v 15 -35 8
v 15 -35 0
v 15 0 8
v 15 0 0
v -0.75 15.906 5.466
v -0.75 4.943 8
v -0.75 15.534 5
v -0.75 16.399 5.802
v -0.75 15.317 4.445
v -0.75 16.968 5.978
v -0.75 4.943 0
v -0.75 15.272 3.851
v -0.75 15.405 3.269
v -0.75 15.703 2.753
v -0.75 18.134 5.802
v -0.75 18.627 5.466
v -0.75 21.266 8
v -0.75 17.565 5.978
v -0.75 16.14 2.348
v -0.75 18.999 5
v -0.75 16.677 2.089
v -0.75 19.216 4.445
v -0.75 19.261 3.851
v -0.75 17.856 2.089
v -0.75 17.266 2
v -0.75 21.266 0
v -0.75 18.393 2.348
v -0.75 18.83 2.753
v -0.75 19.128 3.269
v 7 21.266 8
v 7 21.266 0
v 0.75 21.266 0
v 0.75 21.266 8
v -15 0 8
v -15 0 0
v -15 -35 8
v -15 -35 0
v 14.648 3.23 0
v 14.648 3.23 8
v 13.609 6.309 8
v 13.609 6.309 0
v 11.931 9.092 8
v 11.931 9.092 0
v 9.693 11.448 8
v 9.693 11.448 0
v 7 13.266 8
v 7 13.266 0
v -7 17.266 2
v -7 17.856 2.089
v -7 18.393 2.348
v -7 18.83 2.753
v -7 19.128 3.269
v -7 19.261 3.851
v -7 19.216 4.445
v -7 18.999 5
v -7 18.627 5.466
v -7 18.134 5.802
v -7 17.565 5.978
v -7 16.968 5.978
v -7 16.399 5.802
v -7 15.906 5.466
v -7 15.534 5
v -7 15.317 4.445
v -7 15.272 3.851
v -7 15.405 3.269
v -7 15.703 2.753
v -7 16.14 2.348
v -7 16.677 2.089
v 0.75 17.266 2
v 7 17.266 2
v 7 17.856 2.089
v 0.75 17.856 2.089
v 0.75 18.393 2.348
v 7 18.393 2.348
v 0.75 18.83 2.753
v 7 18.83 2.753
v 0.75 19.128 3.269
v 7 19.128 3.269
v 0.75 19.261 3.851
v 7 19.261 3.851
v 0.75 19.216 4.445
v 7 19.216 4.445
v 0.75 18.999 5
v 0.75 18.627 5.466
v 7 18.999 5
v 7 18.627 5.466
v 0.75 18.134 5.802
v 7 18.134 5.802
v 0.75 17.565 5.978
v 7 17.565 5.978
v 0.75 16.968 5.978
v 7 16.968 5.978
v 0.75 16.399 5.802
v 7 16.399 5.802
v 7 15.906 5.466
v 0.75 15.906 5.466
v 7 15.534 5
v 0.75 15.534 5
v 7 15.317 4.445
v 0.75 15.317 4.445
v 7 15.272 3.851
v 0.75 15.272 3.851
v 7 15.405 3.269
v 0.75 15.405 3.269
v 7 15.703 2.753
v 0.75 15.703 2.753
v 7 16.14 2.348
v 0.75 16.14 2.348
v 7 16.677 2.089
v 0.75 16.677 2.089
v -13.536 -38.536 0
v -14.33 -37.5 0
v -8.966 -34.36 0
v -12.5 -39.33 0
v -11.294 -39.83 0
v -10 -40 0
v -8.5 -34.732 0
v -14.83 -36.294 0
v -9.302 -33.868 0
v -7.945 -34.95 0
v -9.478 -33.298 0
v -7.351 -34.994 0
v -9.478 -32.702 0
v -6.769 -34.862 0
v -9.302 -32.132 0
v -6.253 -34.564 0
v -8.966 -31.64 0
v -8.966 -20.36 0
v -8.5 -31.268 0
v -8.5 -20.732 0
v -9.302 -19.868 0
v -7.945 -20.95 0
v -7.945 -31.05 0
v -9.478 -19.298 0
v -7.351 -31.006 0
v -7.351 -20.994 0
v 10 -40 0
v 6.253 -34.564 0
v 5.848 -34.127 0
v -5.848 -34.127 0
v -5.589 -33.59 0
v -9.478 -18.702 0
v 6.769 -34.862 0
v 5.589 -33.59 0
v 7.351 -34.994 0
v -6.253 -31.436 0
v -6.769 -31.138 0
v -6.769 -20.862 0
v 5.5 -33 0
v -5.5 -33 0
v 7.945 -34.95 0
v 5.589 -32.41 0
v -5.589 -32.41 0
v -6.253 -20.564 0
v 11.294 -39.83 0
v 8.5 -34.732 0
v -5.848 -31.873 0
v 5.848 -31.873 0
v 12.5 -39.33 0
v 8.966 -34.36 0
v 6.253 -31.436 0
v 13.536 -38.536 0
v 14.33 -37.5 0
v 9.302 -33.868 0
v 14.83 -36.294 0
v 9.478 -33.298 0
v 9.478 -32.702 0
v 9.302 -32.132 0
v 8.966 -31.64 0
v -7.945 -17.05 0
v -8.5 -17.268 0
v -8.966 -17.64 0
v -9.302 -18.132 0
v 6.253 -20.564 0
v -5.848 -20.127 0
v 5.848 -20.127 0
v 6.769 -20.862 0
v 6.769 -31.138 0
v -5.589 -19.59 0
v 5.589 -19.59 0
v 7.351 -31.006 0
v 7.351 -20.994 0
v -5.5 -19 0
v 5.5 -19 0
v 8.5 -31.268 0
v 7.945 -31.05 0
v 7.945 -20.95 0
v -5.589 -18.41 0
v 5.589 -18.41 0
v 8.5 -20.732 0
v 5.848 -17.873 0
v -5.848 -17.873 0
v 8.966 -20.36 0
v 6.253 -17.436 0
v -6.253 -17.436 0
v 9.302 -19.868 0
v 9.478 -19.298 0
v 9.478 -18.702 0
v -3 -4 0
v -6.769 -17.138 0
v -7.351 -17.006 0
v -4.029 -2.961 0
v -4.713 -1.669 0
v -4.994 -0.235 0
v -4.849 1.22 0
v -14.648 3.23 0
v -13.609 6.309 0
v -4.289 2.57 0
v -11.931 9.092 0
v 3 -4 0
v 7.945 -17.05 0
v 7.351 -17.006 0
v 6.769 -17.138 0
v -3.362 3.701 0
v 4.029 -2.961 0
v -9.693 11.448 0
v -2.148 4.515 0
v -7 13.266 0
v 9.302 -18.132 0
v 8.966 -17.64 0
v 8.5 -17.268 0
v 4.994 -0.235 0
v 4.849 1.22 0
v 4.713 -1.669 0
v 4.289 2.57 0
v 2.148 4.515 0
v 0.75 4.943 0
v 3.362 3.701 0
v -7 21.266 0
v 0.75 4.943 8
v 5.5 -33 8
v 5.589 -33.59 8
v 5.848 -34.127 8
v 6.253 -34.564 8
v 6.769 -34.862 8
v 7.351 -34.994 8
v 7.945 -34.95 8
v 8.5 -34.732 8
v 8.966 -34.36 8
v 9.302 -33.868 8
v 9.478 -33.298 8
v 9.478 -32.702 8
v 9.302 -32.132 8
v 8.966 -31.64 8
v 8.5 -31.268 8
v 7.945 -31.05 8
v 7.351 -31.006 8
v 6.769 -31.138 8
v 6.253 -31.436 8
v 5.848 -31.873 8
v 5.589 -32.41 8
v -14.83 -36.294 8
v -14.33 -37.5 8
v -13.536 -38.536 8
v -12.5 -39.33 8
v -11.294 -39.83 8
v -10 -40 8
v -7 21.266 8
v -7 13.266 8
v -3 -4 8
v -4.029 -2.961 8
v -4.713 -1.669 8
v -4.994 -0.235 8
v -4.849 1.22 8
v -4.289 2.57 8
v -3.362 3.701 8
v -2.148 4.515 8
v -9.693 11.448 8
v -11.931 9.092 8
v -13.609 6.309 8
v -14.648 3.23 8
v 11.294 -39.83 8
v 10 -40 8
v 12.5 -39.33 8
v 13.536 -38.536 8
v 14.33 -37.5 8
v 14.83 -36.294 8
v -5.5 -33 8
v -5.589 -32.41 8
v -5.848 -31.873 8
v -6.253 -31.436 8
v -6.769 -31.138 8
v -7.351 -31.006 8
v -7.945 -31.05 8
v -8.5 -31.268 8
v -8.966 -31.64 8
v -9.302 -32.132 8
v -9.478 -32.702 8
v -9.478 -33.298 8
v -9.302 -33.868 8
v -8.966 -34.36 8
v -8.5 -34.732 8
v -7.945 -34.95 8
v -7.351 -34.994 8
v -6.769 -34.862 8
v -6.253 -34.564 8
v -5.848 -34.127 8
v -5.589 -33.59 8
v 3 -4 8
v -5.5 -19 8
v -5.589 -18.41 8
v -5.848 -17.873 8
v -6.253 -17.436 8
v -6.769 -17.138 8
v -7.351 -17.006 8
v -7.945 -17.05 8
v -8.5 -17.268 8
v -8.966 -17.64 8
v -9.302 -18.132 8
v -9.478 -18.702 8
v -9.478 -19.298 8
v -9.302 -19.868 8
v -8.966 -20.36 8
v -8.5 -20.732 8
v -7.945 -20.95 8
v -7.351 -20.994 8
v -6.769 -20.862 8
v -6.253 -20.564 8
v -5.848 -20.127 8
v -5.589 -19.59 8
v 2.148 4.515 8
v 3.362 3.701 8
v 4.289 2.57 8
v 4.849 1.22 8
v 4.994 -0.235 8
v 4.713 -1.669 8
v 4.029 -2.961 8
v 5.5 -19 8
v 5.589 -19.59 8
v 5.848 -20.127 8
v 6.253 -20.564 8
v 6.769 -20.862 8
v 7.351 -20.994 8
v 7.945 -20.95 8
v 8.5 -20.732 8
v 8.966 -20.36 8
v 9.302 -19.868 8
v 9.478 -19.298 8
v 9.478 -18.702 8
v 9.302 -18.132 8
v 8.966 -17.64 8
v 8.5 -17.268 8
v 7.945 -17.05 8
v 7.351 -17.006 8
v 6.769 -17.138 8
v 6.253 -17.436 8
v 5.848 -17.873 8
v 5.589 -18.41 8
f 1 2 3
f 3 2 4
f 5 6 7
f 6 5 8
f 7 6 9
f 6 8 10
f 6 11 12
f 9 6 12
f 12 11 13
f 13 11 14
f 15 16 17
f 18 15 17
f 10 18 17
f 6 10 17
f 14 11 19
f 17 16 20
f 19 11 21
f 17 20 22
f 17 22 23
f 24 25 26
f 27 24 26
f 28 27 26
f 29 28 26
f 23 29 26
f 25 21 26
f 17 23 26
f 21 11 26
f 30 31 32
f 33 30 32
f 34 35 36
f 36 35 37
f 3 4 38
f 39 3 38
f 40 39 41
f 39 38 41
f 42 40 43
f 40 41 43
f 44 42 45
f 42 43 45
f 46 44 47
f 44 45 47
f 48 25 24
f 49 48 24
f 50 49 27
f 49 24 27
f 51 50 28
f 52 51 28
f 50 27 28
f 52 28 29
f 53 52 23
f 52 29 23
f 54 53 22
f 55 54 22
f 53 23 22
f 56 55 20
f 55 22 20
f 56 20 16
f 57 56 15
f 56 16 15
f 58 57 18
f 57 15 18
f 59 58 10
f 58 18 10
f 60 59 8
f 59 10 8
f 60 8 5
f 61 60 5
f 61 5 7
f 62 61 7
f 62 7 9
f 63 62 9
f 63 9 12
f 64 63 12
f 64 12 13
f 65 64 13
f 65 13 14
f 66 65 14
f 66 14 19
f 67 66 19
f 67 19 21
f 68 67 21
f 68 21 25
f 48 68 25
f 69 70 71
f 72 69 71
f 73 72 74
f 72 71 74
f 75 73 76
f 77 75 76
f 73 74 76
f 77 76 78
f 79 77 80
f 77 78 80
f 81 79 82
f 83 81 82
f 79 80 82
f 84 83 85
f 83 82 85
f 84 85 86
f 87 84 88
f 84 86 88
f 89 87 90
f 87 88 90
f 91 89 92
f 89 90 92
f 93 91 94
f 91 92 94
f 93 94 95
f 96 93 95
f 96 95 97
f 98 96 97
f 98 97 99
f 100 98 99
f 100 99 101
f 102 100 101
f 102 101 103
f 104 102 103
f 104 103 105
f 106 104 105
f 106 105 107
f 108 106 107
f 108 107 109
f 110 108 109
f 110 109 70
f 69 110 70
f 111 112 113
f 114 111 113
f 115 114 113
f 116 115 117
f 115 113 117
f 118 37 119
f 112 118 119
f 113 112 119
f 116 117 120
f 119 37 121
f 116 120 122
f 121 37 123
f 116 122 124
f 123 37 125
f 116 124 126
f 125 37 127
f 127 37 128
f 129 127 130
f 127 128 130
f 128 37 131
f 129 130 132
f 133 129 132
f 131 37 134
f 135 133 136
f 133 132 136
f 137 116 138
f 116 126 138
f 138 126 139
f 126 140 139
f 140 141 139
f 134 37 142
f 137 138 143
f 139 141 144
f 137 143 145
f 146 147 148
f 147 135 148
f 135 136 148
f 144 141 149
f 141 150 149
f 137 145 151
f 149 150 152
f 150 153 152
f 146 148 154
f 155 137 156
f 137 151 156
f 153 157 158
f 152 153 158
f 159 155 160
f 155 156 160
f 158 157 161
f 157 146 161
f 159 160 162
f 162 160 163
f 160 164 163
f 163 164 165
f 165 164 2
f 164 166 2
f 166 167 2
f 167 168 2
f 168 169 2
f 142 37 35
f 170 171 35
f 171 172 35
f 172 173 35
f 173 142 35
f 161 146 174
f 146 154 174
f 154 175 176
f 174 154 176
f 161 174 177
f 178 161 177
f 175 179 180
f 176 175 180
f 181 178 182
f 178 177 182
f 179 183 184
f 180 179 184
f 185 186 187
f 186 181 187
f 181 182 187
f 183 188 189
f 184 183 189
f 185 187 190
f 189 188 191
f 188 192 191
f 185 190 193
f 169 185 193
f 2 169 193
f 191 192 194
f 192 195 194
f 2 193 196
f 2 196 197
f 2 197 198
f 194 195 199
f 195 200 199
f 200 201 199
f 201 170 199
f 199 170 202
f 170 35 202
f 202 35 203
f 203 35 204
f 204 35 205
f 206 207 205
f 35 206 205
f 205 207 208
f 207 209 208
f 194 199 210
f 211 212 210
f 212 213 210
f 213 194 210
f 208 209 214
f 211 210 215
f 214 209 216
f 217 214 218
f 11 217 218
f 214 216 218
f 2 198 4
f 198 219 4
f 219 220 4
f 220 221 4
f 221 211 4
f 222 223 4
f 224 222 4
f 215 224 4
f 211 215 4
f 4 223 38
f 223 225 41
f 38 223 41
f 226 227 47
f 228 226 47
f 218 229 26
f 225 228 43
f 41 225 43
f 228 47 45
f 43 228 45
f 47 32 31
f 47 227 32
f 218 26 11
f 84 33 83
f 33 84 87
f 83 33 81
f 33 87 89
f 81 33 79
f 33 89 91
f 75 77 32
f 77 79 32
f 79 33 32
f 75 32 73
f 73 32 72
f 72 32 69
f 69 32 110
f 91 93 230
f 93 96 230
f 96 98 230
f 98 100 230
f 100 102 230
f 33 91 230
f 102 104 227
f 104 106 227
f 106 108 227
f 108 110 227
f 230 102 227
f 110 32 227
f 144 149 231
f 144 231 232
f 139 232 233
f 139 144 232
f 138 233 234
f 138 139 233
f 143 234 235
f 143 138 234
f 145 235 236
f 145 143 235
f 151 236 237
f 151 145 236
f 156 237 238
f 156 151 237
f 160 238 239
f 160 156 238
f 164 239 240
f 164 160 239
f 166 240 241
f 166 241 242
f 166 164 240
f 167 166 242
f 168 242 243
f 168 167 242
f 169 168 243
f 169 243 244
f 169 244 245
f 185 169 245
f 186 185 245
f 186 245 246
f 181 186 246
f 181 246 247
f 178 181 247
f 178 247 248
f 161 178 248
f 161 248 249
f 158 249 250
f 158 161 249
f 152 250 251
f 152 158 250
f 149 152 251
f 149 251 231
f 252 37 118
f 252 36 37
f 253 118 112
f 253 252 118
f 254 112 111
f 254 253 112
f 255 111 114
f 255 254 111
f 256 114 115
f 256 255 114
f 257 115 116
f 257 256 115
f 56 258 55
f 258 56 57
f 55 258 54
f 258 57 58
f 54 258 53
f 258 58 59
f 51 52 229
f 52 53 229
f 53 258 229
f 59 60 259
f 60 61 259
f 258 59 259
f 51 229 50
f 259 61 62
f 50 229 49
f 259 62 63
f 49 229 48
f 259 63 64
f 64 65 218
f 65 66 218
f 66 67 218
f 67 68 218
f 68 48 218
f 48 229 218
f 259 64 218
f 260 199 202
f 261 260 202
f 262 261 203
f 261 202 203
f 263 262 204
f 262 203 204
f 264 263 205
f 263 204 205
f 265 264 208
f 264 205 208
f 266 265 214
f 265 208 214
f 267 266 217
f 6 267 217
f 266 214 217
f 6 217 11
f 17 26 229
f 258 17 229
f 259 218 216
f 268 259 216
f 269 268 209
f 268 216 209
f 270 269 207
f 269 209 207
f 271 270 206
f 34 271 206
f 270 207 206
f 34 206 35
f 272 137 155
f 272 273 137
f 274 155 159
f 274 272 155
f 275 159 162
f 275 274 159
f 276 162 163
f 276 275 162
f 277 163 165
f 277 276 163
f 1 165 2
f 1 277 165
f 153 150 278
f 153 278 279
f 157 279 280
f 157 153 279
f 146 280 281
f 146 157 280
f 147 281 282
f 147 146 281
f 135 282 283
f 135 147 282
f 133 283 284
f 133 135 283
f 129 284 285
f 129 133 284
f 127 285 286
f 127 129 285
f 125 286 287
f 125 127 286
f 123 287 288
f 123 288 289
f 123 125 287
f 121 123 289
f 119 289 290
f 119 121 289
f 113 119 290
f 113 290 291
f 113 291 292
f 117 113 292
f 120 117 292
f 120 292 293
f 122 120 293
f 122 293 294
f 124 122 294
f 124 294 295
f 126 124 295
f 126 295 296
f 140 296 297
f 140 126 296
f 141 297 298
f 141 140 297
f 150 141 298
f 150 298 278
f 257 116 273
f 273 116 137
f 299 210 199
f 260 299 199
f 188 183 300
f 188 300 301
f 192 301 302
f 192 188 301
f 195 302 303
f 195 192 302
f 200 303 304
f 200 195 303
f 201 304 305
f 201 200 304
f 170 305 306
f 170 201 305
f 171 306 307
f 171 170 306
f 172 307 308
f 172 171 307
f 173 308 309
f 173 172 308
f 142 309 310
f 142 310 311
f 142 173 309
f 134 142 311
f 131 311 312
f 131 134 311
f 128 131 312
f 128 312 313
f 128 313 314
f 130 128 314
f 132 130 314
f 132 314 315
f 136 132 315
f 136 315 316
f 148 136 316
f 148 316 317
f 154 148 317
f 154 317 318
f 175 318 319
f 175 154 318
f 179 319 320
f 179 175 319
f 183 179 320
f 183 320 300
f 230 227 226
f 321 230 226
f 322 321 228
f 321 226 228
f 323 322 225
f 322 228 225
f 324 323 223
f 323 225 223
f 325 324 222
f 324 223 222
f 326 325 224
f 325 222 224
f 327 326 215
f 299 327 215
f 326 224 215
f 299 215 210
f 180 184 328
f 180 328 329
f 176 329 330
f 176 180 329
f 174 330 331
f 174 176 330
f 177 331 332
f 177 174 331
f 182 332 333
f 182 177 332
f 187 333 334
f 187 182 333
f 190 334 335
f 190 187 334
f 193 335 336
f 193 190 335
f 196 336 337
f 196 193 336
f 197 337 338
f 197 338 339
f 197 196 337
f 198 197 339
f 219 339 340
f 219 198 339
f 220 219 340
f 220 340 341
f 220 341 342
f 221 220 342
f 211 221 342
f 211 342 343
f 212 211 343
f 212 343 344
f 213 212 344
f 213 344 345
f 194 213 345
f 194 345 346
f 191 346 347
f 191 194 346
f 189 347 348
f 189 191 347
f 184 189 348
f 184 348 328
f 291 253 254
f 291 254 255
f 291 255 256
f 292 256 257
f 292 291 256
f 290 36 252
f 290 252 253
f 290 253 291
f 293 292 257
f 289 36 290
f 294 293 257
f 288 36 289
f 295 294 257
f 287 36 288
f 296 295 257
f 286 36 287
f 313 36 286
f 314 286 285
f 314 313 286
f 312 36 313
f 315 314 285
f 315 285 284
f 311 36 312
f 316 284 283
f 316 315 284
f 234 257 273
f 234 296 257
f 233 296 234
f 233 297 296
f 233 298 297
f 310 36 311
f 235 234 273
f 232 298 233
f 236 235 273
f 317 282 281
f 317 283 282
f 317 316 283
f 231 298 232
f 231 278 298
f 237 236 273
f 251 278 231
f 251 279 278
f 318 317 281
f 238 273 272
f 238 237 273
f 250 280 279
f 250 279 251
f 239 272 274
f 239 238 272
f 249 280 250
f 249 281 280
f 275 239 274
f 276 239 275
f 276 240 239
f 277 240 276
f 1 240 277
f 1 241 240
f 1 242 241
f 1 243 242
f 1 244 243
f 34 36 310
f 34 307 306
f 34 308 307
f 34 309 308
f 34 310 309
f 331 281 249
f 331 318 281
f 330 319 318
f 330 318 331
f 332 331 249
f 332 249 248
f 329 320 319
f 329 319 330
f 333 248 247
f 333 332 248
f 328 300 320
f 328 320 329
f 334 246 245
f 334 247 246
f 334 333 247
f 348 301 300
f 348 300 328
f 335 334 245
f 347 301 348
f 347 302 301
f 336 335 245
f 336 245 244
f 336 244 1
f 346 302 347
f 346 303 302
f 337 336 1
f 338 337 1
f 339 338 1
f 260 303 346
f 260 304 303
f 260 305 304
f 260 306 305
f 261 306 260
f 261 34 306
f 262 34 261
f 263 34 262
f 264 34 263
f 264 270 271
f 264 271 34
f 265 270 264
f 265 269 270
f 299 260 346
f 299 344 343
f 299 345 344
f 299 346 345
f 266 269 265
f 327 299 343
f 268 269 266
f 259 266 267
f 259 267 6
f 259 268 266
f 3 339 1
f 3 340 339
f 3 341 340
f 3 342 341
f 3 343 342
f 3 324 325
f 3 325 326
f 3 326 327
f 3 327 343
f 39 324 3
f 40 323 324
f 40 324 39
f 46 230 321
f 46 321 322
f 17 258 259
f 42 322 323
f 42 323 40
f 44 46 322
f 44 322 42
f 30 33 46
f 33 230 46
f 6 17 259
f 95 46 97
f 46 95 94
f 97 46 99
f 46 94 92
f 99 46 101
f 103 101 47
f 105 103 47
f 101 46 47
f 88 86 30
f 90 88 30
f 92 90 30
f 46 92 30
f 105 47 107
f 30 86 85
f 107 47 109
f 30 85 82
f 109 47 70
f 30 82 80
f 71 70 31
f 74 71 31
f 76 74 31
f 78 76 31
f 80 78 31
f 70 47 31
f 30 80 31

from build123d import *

# Parameters (mm, degrees)
SKETCH_1_R          = 2
EXTRUDE_1_DEPTH     = 8
SKETCH_2_R          = 2
CUT_EXTRUDE_1_DEPTH = 15
FILLET_2_R          = 5


with BuildPart() as part:
    # 草图1 → 凸台-拉伸1 (new body)
    with BuildSketch(Plane.XY):
        with BuildLine():
            Line((-15, 0), (-15, -40))
            Line((-15, -40), (15, -40))
            Line((15, -40), (15, 0))
            ThreePointArc((15, 0), (12.845232579, 7.745966692), (7, 13.266499161))
            Line((7, 13.266499161), (7, 21.266499161))
            Line((7, 21.266499161), (0.75, 21.266499161))
            Line((0.75, 21.266499161), (0.75, 4.943429983))
            ThreePointArc((0.75, 4.943429983), (4.848902965, 1.219893452), (3, -4))
            Line((3, -4), (-3, -4))
            ThreePointArc((-3, -4), (-4.848902965, 1.219893452), (-0.75, 4.943429983))
            Line((-0.75, 4.943429983), (-0.75, 21.266499161))
            Line((-0.75, 21.266499161), (-7, 21.266499161))
            Line((-7, 21.266499161), (-7, 13.266499161))
            ThreePointArc((-7, 13.266499161), (-12.845232579, 7.745966692), (-15, 0))
        make_face()
        with Locations((-7.5, -19)):
            Circle(SKETCH_1_R, mode=Mode.SUBTRACT)
        with Locations((-7.5, -33)):
            Circle(SKETCH_1_R, mode=Mode.SUBTRACT)
        with Locations(Location((7.5, -33, 0), (0, 0, 180))):
            Circle(SKETCH_1_R, mode=Mode.SUBTRACT)
        with Locations(Location((7.5, -19, 0), (0, 0, 180))):
            Circle(SKETCH_1_R, mode=Mode.SUBTRACT)
    extrude(amount=EXTRUDE_1_DEPTH)

    # 草图2 → 切除-拉伸1 (cut)
    with BuildSketch(Plane(origin=(7, 0, 0), x_dir=(0, 0, -1), z_dir=(1, 0, 0))):
        with Locations((-4, 17.266499161)):
            Circle(SKETCH_2_R)
    extrude(amount=-CUT_EXTRUDE_1_DEPTH, mode=Mode.SUBTRACT)

    # 圆角2
    fillet_2_edges = [part.edges().sort_by_distance(p)[0] for p in [
        (15, -40, 4),
        (-15, -40, 4),
    ]]
    fillet(fillet_2_edges, radius=FILLET_2_R)


solid = part.part
